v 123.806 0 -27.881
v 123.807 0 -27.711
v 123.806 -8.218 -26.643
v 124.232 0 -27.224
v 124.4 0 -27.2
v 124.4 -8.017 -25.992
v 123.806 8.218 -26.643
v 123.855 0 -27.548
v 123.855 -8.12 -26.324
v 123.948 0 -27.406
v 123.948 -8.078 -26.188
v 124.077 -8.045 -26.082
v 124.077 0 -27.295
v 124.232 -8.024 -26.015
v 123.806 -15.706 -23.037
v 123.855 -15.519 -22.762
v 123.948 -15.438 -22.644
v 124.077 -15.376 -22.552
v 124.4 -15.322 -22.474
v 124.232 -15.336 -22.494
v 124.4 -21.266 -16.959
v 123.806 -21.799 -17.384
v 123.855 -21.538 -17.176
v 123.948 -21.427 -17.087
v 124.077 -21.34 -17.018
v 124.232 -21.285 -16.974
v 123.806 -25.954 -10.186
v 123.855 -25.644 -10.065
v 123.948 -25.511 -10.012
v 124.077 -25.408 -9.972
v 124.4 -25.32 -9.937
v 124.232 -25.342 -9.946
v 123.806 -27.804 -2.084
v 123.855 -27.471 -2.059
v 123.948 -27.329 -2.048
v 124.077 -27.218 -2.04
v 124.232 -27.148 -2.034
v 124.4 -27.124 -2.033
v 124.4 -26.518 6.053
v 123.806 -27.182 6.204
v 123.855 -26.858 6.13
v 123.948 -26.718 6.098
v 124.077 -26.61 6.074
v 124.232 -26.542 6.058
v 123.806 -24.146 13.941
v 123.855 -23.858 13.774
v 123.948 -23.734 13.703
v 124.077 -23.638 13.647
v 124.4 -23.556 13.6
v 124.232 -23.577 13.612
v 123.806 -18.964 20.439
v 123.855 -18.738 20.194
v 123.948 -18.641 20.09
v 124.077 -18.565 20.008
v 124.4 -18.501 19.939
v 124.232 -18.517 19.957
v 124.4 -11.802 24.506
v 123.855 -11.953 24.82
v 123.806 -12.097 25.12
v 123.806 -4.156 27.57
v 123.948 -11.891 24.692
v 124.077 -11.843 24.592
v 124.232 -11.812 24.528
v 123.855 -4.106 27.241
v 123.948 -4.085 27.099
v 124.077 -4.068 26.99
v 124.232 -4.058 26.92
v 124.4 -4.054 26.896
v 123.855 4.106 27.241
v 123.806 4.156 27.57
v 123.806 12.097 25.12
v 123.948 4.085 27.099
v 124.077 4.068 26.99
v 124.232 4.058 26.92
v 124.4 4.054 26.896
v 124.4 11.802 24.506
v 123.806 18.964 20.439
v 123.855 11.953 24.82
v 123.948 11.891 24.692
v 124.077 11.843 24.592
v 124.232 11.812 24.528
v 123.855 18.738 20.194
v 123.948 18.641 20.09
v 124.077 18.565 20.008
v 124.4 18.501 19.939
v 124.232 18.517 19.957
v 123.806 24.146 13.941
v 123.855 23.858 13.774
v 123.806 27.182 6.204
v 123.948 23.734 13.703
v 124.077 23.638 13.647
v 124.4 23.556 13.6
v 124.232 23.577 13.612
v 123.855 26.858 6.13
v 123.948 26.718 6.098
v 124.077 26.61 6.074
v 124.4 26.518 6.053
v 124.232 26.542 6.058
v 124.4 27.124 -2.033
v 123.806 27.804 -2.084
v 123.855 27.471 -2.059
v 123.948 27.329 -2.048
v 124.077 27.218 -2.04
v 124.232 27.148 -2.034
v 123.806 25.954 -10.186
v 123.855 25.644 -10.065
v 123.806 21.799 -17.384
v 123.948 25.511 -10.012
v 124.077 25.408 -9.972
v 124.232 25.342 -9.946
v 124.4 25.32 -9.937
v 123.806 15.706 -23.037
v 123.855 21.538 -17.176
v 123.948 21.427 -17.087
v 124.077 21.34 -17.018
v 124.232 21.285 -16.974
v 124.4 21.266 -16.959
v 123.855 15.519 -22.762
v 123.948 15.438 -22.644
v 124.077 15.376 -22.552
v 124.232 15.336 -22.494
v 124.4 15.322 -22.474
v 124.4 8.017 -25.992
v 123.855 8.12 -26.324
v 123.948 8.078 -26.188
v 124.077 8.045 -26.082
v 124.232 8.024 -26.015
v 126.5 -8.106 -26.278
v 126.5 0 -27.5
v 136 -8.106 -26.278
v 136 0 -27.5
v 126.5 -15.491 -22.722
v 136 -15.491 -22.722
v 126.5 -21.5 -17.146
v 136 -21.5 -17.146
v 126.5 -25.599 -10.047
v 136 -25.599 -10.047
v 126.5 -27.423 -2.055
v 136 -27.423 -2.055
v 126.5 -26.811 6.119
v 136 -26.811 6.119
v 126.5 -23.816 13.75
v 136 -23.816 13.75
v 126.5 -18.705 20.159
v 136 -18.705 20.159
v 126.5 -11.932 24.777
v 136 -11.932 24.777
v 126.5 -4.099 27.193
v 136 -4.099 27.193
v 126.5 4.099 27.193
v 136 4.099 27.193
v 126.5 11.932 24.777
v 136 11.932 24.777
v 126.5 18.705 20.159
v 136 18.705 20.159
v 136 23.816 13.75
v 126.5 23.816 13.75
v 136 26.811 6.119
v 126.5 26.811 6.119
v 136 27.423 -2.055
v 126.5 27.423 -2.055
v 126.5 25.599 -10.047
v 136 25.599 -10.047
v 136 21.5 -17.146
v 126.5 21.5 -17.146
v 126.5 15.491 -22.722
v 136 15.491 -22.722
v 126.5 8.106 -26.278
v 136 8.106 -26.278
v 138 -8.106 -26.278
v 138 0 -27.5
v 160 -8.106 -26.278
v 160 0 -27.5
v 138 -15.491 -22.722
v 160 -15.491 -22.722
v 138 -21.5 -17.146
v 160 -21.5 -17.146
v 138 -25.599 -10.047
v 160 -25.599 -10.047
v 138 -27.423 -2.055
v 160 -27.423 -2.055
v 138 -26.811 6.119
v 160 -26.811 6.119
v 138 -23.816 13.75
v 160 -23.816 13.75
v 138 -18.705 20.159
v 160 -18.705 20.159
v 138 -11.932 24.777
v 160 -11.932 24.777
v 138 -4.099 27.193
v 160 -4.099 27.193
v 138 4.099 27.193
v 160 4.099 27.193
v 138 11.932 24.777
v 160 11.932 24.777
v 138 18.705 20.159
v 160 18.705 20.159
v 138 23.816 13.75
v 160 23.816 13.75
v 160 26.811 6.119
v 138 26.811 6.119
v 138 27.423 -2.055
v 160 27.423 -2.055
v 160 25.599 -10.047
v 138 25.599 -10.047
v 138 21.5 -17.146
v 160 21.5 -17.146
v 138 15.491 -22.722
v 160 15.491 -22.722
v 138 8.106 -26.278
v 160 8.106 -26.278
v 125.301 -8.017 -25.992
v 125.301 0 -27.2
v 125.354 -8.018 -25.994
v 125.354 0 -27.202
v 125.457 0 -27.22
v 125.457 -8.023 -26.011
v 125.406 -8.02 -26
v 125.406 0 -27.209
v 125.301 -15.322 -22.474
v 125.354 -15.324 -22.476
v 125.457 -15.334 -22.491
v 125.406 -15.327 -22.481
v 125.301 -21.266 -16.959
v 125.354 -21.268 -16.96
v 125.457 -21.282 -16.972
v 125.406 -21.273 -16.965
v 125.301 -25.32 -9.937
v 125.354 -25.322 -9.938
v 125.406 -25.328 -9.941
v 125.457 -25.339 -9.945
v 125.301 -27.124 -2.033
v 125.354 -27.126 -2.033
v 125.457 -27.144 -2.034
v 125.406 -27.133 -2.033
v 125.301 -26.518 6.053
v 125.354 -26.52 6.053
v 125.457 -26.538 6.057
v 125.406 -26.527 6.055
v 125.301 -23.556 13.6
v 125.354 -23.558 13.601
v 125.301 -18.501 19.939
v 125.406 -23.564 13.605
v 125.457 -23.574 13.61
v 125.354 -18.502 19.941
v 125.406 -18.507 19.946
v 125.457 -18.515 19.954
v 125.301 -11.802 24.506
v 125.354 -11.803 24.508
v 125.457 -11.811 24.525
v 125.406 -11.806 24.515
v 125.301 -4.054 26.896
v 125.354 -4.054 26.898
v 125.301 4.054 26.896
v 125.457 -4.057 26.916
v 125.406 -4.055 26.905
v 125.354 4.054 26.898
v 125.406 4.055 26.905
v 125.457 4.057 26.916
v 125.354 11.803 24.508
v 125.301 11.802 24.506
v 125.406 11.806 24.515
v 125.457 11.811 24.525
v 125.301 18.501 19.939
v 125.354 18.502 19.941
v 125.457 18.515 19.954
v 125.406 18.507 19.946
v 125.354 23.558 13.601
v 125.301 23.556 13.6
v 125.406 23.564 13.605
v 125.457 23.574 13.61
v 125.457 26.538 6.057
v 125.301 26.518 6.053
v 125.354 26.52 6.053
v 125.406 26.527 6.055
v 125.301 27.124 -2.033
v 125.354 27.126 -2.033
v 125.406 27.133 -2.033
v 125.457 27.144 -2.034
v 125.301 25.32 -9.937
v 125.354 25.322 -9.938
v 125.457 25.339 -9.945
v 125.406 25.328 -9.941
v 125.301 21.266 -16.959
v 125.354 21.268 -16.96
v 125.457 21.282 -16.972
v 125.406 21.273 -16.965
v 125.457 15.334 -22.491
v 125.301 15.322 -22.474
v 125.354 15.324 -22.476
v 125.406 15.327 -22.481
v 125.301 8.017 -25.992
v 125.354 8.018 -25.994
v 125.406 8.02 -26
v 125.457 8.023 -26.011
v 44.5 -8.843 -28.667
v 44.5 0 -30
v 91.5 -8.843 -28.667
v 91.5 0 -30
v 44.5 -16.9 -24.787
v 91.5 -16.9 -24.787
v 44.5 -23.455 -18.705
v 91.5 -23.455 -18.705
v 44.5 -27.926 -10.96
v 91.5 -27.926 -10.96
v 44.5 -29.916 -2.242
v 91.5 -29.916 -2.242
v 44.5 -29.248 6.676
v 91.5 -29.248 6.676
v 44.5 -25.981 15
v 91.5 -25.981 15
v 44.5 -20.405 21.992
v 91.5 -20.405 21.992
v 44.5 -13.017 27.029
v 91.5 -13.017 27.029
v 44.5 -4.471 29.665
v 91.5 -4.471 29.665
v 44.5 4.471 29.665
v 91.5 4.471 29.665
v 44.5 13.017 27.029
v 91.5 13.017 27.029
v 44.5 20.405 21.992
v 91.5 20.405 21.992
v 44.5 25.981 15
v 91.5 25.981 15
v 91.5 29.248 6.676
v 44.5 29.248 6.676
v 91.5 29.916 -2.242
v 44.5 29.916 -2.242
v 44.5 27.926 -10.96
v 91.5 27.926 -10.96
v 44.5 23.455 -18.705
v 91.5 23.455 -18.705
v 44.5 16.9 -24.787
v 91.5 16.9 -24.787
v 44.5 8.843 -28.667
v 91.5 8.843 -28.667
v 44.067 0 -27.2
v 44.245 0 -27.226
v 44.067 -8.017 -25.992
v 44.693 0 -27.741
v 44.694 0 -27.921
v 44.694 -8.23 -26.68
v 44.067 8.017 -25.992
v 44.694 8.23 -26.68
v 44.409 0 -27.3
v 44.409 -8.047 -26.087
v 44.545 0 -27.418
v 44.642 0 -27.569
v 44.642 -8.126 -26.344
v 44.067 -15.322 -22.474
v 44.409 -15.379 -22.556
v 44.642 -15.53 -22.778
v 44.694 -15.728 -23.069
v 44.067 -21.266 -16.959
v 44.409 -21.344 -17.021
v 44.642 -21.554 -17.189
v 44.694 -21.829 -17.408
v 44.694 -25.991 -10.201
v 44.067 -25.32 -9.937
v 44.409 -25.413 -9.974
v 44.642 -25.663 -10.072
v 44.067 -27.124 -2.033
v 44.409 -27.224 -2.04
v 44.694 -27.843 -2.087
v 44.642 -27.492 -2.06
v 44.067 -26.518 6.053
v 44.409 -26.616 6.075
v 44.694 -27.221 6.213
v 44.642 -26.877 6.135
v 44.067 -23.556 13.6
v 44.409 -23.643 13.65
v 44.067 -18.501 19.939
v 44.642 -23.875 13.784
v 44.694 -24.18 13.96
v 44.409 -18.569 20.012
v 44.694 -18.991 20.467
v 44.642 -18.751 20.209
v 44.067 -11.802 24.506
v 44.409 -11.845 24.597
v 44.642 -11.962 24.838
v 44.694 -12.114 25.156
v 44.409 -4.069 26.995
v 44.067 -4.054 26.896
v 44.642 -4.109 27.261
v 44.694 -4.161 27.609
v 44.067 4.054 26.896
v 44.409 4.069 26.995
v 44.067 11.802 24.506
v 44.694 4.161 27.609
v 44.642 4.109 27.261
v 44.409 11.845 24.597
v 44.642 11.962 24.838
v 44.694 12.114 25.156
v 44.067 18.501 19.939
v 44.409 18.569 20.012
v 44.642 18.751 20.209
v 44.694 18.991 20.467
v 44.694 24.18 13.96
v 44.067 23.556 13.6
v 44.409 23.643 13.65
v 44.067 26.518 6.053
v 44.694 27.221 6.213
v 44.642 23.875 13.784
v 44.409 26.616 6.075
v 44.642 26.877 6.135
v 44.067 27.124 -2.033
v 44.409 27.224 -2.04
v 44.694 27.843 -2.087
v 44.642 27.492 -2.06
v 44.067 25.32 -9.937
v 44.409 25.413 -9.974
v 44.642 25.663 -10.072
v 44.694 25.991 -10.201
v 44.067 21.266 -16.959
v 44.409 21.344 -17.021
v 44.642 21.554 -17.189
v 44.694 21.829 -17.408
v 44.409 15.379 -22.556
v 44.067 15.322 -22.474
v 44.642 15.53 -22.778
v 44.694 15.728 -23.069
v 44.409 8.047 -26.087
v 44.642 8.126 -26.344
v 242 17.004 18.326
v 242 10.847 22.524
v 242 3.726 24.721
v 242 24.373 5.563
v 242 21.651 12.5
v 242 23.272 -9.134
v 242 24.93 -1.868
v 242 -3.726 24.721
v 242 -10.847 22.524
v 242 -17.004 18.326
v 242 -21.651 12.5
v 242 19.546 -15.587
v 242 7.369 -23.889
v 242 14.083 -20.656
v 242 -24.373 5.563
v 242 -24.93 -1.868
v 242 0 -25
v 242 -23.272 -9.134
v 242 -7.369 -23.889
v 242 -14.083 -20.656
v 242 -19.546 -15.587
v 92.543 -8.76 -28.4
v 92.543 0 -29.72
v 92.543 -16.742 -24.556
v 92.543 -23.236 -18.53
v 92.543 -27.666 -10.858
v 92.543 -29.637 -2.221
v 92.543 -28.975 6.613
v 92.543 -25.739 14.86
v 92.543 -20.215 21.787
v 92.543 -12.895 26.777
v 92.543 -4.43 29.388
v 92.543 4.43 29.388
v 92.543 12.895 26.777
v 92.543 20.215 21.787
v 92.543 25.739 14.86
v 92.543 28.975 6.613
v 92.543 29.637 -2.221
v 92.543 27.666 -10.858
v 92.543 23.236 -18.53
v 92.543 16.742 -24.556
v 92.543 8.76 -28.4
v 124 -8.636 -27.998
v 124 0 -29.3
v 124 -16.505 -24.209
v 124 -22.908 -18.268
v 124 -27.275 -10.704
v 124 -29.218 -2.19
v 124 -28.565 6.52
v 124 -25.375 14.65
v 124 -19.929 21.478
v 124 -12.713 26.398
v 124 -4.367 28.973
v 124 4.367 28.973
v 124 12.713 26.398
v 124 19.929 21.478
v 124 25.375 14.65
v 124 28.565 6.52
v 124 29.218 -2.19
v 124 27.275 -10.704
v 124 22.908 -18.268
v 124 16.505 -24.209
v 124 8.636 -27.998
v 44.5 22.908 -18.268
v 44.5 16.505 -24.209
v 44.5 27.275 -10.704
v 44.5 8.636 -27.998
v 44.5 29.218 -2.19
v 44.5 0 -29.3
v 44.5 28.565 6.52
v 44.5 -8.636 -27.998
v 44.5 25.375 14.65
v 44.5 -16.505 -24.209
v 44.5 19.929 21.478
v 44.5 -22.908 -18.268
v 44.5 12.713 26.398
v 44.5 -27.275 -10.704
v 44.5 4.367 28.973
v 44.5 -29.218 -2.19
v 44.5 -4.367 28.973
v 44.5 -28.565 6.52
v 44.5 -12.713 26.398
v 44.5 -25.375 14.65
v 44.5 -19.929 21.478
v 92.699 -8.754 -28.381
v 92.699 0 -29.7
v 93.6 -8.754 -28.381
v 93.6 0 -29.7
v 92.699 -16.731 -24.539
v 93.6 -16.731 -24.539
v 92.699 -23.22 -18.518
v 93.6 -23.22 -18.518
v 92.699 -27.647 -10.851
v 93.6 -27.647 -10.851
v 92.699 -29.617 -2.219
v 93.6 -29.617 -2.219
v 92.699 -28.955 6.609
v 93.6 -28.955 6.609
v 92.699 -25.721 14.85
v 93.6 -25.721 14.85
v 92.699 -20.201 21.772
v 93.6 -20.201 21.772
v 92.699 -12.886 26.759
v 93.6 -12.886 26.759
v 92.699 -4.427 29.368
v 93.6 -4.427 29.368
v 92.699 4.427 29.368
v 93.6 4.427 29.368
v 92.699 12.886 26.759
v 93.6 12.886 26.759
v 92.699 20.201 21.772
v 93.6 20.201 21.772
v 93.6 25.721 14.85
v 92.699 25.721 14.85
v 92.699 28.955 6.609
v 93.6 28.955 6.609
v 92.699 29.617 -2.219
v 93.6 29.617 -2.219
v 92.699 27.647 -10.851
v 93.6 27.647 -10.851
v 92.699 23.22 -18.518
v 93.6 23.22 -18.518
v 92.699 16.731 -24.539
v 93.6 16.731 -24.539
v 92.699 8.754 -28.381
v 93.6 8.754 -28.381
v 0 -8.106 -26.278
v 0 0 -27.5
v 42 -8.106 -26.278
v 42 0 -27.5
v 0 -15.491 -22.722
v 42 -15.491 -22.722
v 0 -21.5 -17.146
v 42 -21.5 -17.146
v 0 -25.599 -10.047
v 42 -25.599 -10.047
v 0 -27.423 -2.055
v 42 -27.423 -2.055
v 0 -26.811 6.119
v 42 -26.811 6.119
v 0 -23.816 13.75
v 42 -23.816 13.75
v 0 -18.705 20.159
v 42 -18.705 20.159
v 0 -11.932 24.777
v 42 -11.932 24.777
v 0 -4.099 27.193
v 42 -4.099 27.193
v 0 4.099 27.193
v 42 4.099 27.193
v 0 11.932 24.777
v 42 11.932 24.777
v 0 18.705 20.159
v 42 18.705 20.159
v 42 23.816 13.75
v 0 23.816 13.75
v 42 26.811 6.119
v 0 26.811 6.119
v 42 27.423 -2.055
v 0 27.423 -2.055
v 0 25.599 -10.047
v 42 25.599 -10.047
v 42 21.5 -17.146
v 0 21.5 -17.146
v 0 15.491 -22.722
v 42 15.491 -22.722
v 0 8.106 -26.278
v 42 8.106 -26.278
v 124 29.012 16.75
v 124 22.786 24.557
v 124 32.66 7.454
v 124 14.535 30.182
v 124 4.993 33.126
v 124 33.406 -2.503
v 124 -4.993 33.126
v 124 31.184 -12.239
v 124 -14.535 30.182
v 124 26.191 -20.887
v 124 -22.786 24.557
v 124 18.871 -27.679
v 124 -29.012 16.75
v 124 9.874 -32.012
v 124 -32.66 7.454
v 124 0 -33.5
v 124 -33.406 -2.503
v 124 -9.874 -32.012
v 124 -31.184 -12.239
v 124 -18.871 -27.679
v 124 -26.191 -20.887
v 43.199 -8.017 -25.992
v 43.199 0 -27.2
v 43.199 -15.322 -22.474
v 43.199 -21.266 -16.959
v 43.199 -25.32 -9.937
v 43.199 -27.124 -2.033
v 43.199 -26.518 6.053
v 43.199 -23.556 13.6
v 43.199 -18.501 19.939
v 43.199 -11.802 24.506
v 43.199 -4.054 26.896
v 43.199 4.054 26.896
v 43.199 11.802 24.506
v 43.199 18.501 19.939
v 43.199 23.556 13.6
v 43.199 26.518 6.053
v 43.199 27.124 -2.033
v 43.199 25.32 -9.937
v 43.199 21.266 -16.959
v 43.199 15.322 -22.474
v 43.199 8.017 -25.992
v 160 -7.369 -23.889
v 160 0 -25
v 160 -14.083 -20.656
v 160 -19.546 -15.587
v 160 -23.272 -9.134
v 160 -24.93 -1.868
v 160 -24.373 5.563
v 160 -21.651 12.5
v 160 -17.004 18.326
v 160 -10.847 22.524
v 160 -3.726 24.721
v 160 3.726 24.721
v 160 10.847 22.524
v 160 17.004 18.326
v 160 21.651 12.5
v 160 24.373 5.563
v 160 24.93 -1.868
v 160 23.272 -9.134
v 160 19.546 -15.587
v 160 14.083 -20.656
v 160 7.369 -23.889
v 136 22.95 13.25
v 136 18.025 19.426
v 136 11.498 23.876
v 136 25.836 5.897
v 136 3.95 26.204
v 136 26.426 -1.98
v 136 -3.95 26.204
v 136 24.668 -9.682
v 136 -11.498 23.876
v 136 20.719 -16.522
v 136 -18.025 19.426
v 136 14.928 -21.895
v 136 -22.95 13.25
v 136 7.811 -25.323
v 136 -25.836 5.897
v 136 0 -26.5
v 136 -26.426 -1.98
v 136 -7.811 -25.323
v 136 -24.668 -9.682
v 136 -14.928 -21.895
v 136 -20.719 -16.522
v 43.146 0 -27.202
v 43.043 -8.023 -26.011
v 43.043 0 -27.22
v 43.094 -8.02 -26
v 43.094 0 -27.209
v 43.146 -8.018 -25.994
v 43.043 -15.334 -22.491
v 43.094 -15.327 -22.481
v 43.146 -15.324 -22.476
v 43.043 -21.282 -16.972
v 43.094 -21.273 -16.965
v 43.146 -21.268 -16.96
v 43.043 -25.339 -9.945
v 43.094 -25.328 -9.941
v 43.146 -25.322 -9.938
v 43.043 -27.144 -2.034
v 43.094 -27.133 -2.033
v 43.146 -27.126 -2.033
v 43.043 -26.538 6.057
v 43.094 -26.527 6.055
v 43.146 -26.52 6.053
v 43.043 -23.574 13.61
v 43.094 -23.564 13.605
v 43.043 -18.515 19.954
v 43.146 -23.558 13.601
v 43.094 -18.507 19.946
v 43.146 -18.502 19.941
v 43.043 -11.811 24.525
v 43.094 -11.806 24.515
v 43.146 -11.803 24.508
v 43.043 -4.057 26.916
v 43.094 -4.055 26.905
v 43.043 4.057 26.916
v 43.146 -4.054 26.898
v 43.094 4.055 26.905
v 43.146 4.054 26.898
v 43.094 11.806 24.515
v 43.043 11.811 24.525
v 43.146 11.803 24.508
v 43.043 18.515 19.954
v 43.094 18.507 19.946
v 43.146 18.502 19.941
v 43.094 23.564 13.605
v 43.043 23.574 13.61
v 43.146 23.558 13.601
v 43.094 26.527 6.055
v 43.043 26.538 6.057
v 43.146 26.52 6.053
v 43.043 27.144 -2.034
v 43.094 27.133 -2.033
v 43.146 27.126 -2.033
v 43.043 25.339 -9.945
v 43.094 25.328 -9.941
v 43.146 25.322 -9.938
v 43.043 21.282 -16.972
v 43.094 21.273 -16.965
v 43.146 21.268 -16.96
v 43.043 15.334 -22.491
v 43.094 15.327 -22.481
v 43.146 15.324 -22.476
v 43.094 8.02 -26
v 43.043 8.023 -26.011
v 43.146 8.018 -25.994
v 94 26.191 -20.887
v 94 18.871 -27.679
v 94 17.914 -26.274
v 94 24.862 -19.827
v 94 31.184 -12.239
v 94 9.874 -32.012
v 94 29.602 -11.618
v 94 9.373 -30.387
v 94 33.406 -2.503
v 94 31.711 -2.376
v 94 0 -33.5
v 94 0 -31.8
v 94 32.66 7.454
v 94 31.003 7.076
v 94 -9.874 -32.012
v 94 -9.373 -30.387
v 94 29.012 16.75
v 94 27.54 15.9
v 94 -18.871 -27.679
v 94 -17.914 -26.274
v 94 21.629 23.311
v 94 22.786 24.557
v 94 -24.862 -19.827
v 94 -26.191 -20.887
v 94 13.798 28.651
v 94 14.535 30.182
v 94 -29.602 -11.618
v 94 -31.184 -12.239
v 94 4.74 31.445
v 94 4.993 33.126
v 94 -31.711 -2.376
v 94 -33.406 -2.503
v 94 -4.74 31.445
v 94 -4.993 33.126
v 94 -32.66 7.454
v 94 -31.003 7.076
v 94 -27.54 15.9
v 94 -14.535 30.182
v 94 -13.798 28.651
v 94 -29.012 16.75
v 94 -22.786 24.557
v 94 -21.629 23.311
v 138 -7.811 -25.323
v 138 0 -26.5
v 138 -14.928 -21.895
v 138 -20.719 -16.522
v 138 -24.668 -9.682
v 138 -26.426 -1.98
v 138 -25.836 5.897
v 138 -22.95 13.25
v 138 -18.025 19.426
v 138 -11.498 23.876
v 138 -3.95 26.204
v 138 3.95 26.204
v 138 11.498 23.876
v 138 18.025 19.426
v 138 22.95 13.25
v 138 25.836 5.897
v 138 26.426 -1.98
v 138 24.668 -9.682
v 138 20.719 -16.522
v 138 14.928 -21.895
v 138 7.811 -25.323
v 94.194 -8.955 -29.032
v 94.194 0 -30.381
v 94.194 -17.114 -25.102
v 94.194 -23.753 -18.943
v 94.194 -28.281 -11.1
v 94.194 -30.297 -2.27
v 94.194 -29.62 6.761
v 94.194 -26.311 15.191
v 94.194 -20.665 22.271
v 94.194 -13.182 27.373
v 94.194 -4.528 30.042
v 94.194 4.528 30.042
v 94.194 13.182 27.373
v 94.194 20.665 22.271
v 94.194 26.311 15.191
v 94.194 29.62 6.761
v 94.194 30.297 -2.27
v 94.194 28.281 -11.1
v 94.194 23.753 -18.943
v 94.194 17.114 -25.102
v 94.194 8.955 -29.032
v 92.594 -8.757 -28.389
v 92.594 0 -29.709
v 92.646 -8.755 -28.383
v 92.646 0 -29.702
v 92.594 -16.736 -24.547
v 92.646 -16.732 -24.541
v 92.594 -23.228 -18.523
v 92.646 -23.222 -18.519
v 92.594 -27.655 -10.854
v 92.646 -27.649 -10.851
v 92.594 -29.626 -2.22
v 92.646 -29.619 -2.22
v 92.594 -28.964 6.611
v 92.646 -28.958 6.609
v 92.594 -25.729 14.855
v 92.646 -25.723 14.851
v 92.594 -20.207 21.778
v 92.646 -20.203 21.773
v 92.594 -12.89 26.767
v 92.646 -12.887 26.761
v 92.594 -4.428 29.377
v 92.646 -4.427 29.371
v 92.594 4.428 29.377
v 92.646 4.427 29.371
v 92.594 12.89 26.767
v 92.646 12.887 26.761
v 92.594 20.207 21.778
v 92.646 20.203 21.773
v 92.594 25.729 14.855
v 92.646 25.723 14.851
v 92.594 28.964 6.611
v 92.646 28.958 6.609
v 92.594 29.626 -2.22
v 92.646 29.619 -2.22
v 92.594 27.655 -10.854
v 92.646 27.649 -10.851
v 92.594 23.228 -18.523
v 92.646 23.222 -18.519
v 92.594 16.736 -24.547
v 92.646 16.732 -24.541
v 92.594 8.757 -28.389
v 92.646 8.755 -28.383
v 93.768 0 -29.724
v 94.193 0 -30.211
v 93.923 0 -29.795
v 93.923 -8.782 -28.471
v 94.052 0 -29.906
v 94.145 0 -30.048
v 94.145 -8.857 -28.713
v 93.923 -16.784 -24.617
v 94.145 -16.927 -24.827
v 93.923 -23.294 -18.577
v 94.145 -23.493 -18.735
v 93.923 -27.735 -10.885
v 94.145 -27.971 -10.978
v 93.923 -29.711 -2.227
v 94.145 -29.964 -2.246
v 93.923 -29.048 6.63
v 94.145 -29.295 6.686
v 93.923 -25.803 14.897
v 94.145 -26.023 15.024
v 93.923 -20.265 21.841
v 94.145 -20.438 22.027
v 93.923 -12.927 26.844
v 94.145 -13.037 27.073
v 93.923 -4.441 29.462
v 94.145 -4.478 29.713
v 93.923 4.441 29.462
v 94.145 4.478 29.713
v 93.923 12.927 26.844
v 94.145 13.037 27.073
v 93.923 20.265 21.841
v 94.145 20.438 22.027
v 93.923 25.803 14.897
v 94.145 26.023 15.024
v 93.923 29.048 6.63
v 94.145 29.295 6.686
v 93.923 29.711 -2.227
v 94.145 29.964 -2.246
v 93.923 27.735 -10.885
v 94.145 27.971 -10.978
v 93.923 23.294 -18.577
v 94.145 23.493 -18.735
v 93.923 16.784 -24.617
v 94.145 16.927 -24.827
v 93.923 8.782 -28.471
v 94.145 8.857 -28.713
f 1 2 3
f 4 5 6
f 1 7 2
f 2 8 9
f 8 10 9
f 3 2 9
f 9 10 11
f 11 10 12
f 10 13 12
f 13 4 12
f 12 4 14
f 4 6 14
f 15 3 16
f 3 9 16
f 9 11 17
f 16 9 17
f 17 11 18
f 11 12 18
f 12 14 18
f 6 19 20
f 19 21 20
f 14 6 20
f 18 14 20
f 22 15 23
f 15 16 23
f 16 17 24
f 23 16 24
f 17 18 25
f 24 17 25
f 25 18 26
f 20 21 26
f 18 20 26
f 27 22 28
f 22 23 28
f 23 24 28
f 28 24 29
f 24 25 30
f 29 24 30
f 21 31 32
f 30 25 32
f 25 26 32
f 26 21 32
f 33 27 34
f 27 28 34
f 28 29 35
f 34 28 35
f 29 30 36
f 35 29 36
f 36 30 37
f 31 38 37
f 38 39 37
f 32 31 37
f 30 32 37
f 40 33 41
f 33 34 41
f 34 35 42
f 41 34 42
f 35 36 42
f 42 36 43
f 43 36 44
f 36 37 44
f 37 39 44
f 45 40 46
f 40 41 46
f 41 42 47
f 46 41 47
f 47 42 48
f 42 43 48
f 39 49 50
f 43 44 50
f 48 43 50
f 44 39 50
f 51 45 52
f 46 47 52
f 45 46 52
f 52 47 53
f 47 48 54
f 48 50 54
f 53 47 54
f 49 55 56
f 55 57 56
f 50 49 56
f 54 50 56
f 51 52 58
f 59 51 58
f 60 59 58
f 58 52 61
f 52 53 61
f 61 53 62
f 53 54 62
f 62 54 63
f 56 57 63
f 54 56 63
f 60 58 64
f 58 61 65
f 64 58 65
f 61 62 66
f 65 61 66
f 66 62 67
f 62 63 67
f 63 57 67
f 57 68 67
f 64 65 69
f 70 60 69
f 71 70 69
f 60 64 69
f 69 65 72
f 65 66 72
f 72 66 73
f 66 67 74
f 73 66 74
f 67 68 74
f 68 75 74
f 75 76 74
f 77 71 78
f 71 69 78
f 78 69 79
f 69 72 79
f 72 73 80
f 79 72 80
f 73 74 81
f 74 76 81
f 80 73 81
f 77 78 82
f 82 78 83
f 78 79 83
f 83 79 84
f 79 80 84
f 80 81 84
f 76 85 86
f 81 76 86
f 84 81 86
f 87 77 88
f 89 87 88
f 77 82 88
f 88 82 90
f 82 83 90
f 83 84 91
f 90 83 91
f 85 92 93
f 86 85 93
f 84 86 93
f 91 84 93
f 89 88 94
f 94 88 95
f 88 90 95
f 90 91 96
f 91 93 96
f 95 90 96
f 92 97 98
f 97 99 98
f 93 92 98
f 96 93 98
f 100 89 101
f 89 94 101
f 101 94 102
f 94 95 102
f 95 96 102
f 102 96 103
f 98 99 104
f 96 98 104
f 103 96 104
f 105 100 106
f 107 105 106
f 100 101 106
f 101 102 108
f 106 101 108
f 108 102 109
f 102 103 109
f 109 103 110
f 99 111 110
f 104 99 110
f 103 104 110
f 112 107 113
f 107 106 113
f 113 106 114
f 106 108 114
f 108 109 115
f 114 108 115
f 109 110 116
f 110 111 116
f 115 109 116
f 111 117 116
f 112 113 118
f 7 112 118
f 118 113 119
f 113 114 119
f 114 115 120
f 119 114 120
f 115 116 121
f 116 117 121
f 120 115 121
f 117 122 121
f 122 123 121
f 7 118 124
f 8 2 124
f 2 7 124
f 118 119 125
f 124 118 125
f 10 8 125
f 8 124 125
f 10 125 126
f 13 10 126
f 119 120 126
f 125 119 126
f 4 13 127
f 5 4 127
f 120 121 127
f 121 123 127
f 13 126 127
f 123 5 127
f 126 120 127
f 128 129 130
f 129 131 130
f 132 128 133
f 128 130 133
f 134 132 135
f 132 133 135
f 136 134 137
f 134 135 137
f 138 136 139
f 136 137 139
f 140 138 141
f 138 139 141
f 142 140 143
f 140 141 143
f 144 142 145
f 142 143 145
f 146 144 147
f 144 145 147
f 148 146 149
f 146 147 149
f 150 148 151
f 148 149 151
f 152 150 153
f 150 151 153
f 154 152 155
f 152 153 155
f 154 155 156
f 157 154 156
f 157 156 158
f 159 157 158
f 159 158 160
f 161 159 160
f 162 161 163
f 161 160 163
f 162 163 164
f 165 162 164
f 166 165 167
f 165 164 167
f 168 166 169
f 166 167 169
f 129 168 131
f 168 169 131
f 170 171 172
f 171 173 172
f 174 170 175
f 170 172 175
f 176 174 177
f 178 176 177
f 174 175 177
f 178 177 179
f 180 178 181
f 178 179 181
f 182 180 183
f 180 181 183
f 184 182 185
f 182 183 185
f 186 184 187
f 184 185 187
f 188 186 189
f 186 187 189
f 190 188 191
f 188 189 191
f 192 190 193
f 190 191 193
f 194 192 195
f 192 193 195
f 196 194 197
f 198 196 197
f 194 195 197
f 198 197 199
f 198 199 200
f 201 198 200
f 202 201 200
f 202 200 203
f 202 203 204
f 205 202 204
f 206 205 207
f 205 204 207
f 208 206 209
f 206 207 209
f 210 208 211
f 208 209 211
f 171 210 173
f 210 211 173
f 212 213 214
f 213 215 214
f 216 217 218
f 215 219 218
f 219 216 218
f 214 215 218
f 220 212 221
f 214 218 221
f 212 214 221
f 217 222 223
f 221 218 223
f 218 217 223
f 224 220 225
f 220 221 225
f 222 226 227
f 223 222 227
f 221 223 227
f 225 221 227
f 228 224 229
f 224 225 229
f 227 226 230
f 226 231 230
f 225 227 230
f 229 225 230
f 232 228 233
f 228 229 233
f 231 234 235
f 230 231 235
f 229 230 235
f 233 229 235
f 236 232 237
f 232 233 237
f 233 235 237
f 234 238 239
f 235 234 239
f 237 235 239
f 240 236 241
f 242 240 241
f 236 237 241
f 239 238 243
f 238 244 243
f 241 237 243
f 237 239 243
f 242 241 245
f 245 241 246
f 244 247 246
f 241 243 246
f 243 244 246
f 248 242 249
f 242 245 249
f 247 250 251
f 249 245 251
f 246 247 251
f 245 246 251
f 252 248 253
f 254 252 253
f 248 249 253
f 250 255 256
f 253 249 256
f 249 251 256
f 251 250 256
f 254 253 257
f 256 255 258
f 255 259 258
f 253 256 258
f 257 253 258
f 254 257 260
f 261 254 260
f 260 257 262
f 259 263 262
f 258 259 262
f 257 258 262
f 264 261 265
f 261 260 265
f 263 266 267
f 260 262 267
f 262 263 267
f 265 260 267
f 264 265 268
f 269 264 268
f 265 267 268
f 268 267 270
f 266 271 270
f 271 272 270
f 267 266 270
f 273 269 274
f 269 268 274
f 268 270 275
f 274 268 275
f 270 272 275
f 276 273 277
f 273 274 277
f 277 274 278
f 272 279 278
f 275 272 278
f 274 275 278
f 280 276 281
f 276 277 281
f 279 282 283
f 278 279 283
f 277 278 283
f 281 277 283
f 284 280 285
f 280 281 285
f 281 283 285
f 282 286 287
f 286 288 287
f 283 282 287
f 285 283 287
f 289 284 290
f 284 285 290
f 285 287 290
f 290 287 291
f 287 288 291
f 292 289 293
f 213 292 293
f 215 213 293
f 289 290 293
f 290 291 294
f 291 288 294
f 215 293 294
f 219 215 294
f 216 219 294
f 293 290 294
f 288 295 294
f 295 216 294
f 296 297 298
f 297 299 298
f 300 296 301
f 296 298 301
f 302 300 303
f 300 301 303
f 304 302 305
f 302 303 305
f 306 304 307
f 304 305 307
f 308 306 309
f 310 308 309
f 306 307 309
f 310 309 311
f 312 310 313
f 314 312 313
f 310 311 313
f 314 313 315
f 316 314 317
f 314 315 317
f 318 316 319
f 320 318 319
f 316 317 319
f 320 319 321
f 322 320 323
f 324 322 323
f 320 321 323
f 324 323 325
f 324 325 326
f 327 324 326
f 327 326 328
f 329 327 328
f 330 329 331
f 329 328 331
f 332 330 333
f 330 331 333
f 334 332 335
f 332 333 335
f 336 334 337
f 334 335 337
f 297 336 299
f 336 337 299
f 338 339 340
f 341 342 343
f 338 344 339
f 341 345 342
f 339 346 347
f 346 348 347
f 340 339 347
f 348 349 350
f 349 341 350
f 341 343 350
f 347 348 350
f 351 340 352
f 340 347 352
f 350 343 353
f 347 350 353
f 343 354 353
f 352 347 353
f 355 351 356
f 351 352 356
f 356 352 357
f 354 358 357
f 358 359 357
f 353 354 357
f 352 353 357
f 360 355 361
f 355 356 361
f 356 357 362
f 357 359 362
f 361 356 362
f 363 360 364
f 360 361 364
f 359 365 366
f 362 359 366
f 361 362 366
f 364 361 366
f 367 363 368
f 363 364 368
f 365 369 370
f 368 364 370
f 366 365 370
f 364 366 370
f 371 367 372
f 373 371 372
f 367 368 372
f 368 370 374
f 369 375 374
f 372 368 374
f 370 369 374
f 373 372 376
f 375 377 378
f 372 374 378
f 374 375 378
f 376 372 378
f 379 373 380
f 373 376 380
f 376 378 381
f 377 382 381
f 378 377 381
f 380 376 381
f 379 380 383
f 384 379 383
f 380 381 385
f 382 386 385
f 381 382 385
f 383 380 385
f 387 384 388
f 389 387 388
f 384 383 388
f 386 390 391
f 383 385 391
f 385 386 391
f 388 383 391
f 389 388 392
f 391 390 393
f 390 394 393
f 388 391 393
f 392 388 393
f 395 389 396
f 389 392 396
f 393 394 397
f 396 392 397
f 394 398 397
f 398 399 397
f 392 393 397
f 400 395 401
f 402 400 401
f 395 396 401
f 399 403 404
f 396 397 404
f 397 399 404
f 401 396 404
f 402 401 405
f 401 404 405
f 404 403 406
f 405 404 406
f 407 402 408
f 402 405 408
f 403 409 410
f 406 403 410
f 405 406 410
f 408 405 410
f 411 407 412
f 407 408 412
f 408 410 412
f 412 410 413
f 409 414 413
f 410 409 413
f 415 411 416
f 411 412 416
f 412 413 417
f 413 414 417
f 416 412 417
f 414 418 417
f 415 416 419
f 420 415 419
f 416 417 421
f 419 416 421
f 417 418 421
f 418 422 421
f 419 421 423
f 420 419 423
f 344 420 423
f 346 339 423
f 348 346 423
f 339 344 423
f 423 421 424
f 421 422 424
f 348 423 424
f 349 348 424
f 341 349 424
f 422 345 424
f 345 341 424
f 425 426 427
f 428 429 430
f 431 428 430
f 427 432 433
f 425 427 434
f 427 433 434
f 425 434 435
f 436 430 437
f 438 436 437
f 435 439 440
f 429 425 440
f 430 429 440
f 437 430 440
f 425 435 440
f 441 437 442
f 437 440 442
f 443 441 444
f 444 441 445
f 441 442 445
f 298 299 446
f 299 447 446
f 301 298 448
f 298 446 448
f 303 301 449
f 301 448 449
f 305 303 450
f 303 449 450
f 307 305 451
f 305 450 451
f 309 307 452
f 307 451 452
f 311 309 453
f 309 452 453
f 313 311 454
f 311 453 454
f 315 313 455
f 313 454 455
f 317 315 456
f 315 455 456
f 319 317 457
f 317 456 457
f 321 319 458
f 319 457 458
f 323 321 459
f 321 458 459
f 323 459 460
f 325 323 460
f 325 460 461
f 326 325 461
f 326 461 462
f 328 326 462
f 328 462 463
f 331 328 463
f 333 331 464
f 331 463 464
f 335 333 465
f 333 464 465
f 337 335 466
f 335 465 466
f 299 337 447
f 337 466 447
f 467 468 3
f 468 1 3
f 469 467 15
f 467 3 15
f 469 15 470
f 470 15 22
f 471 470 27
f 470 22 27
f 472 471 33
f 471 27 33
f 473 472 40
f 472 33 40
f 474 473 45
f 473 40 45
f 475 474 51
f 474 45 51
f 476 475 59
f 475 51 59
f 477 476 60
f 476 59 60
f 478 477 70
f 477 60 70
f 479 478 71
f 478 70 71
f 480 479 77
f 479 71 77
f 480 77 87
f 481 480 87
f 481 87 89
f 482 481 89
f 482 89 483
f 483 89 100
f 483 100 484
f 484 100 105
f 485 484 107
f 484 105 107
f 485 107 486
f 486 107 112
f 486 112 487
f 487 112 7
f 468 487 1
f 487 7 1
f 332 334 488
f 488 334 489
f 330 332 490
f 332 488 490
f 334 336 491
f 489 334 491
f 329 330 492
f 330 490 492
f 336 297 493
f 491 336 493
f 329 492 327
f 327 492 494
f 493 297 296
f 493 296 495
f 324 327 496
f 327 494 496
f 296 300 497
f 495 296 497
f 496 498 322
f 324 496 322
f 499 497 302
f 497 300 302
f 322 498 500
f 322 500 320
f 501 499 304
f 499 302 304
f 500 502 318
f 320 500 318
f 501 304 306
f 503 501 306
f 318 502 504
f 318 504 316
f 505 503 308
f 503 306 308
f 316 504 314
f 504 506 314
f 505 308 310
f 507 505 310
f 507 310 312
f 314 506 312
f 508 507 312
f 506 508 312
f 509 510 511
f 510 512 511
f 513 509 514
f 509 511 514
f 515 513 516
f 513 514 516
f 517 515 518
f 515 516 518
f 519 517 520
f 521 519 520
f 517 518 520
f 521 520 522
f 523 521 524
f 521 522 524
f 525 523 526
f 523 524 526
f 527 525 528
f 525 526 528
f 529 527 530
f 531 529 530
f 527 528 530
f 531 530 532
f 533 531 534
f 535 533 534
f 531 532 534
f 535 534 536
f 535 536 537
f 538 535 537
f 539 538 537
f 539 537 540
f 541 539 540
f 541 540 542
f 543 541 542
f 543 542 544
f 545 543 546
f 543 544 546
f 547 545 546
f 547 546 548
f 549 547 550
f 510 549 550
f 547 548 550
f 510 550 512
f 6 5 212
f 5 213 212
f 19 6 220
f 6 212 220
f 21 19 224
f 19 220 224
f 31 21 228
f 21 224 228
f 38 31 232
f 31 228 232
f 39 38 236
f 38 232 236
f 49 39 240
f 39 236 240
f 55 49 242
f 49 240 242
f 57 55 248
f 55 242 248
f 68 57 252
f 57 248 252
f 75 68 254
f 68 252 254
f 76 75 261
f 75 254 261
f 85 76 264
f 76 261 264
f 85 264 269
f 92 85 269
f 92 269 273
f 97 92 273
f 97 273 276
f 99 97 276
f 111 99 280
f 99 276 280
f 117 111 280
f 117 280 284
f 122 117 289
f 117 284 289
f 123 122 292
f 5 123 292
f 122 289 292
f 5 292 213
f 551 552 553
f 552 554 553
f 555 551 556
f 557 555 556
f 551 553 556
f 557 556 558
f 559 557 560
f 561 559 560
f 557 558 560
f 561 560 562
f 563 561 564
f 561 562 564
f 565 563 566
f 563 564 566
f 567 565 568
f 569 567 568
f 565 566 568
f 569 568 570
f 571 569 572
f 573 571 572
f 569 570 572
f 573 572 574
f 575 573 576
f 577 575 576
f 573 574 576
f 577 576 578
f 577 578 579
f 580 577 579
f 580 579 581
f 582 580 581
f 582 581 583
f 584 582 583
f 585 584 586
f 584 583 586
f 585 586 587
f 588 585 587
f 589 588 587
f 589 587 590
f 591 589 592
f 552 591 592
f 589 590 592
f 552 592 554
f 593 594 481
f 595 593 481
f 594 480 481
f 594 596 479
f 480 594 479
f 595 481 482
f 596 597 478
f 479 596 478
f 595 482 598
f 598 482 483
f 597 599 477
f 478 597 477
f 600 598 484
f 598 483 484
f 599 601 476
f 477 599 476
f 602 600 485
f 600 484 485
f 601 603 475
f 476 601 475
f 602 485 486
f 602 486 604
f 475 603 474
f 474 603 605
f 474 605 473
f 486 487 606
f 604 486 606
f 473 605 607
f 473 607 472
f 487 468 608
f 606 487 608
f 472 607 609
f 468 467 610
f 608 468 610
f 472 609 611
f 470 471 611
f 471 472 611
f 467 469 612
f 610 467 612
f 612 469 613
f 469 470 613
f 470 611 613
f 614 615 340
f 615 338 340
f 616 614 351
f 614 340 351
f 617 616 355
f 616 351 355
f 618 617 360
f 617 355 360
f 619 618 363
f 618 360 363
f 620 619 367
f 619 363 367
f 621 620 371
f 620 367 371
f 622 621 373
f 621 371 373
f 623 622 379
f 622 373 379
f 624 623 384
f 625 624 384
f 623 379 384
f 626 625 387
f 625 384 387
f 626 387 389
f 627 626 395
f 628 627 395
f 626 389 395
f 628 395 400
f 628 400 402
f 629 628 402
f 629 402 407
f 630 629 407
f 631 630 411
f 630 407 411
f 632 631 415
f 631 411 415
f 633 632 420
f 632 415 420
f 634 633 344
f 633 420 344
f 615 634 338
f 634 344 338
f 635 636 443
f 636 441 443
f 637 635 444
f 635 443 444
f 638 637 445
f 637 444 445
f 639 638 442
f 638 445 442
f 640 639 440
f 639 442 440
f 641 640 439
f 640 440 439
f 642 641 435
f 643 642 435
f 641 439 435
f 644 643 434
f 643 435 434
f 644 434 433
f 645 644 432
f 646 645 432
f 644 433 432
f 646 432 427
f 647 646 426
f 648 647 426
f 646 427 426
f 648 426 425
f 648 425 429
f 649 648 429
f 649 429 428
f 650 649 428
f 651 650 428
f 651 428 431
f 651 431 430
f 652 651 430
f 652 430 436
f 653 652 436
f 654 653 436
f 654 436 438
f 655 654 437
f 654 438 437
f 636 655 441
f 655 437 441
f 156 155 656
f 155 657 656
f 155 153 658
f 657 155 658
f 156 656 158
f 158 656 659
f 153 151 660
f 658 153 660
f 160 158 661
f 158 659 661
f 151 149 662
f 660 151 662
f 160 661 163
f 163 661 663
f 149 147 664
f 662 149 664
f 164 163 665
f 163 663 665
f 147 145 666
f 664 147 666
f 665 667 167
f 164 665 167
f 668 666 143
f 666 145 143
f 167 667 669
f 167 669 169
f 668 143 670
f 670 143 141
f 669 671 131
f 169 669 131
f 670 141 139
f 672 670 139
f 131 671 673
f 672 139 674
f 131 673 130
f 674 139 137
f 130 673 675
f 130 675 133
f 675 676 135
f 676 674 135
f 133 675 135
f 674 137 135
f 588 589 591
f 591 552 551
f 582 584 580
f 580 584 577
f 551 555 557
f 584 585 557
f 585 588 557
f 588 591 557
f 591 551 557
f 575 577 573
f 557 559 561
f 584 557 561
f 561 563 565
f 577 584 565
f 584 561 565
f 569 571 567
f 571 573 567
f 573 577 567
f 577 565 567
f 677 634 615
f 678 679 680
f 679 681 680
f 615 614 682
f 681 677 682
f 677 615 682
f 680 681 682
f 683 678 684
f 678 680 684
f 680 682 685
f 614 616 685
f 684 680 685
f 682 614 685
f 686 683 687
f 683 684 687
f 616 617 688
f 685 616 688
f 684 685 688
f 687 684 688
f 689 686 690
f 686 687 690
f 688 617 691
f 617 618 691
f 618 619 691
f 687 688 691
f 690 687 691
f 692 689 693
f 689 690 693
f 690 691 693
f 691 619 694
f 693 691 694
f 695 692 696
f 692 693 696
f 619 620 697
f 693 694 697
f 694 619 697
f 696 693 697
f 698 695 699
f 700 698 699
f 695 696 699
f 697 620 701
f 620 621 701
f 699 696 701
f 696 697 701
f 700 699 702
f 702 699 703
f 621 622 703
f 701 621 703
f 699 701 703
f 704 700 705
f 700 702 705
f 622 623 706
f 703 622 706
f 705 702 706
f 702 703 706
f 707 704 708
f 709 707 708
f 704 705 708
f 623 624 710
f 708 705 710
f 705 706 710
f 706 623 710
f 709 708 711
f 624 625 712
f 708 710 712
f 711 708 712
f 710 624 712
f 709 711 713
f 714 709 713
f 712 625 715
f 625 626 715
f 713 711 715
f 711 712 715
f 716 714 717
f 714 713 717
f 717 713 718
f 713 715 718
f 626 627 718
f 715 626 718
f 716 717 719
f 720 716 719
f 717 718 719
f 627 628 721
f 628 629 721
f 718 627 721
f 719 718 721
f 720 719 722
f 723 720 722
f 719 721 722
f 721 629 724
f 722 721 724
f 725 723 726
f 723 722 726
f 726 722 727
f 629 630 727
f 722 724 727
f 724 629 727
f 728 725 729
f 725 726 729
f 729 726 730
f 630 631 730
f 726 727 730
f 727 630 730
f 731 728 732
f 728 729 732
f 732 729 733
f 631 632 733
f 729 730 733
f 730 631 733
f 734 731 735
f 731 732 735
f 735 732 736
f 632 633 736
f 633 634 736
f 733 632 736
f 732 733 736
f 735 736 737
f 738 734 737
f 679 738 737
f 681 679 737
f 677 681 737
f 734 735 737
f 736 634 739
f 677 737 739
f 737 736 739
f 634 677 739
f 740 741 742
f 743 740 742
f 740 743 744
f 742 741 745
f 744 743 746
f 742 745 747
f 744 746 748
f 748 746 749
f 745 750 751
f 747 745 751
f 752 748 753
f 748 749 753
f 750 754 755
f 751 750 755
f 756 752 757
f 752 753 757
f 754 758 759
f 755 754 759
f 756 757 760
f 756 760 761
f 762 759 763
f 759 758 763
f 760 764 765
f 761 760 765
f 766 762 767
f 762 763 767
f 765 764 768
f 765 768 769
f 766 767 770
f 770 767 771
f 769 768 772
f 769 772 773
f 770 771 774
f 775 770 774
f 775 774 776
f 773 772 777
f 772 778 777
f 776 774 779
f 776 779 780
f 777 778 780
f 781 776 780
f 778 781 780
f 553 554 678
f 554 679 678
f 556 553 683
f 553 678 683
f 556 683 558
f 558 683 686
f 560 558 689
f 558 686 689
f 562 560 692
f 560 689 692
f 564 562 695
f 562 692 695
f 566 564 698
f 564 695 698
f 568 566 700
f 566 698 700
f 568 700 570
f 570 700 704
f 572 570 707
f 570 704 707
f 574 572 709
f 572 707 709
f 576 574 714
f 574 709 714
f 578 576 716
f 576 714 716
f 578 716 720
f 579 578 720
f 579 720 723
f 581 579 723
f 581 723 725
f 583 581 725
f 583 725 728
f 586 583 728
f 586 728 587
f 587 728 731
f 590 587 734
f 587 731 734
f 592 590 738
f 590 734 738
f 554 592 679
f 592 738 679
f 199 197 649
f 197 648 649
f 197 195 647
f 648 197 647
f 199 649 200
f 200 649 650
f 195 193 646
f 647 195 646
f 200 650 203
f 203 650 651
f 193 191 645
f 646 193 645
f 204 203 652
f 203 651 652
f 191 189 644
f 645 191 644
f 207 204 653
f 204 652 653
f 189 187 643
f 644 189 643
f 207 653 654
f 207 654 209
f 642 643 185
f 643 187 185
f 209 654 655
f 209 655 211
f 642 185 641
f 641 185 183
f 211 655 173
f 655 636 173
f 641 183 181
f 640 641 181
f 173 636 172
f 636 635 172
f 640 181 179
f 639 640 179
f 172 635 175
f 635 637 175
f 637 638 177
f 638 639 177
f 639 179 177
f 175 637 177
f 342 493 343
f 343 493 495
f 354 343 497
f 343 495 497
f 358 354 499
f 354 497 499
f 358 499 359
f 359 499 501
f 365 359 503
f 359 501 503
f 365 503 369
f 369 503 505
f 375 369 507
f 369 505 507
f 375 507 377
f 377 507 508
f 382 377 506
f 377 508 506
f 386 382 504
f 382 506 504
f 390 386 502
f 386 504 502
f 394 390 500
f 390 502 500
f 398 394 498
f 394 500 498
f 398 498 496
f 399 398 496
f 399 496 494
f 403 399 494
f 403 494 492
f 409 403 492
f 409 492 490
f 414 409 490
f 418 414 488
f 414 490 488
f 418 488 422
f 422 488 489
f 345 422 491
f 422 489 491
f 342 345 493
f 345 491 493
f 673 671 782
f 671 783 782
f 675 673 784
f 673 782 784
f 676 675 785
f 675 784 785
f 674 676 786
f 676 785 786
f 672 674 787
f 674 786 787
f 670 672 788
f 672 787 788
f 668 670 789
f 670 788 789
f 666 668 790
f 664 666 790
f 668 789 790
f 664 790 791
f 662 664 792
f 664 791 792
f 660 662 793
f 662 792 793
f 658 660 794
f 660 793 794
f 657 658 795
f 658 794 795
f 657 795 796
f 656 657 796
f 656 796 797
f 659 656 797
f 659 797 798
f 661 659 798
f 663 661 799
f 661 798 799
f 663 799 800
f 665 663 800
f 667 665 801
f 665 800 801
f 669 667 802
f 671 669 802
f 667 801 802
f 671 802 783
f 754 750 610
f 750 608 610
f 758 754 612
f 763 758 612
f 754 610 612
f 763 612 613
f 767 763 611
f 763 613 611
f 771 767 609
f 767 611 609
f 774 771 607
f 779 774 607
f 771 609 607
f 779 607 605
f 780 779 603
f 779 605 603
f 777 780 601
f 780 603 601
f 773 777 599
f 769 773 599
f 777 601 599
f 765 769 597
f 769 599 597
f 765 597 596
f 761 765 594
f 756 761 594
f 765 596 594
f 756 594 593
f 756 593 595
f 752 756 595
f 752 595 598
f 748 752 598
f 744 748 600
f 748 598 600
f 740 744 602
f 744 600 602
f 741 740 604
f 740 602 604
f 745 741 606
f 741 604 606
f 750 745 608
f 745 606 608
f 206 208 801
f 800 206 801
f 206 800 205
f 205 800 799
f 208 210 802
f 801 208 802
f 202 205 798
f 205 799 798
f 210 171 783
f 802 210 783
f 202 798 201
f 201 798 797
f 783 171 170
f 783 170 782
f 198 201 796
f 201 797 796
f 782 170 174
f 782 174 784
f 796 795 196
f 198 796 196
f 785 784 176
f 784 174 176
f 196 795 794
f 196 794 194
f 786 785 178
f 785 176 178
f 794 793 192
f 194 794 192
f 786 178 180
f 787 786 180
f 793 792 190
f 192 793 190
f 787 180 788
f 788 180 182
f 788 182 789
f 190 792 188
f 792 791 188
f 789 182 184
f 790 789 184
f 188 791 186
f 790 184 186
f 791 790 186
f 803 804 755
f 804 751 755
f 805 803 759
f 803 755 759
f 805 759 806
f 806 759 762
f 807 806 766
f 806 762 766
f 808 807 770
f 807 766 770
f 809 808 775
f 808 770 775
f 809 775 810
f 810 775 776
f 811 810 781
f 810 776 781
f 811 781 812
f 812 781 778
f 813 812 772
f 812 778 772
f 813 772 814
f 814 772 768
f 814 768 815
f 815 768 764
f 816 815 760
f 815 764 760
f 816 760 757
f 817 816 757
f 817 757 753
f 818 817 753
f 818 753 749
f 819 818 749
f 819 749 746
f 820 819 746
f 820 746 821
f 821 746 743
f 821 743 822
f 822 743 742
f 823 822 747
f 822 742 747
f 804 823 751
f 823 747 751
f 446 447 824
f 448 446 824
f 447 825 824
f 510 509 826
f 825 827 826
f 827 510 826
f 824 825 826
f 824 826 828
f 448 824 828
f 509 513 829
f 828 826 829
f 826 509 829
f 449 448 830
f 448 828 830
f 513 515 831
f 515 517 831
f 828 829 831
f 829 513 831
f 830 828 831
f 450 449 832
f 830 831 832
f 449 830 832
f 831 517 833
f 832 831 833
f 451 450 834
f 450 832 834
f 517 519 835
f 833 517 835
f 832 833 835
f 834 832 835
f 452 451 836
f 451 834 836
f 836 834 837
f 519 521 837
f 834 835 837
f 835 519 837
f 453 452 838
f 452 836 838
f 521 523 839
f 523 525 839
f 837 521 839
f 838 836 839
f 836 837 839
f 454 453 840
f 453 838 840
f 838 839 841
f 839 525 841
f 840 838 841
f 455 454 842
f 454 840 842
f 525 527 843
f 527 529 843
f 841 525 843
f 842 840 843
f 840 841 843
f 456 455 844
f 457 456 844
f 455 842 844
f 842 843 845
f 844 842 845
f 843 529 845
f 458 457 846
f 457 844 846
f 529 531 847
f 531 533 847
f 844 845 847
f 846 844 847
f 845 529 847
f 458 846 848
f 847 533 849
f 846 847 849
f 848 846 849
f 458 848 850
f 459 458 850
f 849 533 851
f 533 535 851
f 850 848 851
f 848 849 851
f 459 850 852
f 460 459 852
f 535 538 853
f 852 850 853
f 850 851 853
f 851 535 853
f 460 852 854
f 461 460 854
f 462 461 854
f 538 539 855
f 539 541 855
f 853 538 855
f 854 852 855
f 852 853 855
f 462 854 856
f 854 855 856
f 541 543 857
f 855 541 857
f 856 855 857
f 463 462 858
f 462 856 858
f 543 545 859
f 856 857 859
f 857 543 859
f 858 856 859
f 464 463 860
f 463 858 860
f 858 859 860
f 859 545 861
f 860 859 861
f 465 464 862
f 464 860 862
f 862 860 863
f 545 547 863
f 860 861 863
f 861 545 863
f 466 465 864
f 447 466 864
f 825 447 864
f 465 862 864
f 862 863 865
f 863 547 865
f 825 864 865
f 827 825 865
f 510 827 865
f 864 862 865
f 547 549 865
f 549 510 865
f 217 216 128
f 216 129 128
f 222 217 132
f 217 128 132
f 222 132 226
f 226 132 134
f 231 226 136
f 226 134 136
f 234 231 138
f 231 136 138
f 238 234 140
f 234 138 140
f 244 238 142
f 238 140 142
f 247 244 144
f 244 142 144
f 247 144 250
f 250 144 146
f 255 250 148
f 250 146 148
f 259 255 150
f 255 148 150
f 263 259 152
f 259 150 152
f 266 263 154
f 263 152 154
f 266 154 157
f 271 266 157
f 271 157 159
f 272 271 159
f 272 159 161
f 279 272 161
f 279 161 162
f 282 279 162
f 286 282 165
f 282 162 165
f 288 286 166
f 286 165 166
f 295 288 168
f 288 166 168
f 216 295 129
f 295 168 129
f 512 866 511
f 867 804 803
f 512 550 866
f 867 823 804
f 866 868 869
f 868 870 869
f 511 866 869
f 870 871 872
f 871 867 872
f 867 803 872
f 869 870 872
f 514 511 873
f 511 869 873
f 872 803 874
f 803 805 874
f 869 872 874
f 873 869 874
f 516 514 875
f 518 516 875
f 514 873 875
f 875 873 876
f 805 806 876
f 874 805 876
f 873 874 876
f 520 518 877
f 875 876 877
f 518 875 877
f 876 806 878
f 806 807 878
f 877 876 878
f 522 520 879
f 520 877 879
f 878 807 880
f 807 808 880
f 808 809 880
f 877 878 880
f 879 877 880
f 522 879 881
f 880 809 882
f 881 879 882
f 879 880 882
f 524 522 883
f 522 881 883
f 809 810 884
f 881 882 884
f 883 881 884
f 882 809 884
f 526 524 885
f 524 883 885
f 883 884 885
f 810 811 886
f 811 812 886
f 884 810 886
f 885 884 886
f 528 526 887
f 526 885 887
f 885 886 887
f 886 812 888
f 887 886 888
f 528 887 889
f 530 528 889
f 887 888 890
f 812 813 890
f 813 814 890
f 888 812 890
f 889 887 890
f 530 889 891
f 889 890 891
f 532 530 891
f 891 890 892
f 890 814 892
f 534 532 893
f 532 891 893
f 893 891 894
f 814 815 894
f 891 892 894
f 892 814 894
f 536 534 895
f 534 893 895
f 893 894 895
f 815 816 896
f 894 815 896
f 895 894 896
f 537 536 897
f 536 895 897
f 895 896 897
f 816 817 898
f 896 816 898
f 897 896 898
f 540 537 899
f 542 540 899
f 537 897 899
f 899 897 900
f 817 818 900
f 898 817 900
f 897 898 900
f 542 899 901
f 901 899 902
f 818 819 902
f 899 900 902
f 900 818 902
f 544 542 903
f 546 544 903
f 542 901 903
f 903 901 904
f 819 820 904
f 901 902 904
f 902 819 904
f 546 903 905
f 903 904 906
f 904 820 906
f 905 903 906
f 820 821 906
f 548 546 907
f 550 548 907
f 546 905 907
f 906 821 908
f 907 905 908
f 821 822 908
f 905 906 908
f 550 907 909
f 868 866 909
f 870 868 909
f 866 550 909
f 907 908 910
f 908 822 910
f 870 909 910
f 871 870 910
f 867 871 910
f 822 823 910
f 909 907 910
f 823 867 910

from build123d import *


with BuildPart() as part:
    # Skizze1 → Rotation1 (revolve)
    with BuildSketch(Plane(origin=(0, 0, 0), x_dir=(1, 0, 0), z_dir=(0, 1, 0))):
        with BuildLine():
            Line((0, 0), (0, 27.5))
            Line((0, 27.5), (42, 27.5))
            Line((42, 27.5), (43.043315314, 27.220444504))
            ThreePointArc((43.043315314, 27.220444504), (43.120291025, 27.205133083), (43.198606741, 27.2))
            Line((43.198606741, 27.2), (44.067315551, 27.2))
            ThreePointArc((44.067315551, 27.2), (44.544808566, 27.417606104), (44.693842758, 27.920737106))
            Line((44.693842758, 27.920737106), (44.5, 29.3))
            Line((44.5, 29.3), (44.5, 30))
            Line((44.5, 30), (91.5, 30))
            Line((91.5, 30), (92.543315314, 29.720444504))
            ThreePointArc((92.543315314, 29.720444504), (92.620291025, 29.705133083), (92.698606741, 29.7))
            Line((92.698606741, 29.7), (93.6, 29.7))
            ThreePointArc((93.6, 29.7), (94.052155597, 29.905594985), (94.19444145, 30.38148228))
            Line((94.19444145, 30.38148228), (94, 31.8))
            Line((94, 31.8), (94, 33.5))
            Line((94, 33.5), (124, 33.5))
            Line((124, 33.5), (124, 29.3))
            Line((124, 29.3), (123.80555855, 27.88148228))
            ThreePointArc((123.80555855, 27.88148228), (123.947844403, 27.405594985), (124.4, 27.2))
            Line((124.4, 27.2), (125.301393259, 27.2))
            ThreePointArc((125.301393259, 27.2), (125.379708975, 27.205133083), (125.456684686, 27.220444504))
            Line((125.456684686, 27.220444504), (126.5, 27.5))
            Line((126.5, 27.5), (136, 27.5))
            Line((136, 27.5), (136, 26.5))
            Line((136, 26.5), (138, 26.5))
            Line((138, 26.5), (138, 27.5))
            Line((138, 27.5), (160, 27.5))
            Line((160, 27.5), (160, 25))
            Line((160, 25), (242, 25))
            Line((242, 25), (242, 0))
            Line((242, 0), (0, 0))
        make_face()
    revolve(axis=Axis((242, 0, 0), (-1, 0, 0)))


solid = part.part
